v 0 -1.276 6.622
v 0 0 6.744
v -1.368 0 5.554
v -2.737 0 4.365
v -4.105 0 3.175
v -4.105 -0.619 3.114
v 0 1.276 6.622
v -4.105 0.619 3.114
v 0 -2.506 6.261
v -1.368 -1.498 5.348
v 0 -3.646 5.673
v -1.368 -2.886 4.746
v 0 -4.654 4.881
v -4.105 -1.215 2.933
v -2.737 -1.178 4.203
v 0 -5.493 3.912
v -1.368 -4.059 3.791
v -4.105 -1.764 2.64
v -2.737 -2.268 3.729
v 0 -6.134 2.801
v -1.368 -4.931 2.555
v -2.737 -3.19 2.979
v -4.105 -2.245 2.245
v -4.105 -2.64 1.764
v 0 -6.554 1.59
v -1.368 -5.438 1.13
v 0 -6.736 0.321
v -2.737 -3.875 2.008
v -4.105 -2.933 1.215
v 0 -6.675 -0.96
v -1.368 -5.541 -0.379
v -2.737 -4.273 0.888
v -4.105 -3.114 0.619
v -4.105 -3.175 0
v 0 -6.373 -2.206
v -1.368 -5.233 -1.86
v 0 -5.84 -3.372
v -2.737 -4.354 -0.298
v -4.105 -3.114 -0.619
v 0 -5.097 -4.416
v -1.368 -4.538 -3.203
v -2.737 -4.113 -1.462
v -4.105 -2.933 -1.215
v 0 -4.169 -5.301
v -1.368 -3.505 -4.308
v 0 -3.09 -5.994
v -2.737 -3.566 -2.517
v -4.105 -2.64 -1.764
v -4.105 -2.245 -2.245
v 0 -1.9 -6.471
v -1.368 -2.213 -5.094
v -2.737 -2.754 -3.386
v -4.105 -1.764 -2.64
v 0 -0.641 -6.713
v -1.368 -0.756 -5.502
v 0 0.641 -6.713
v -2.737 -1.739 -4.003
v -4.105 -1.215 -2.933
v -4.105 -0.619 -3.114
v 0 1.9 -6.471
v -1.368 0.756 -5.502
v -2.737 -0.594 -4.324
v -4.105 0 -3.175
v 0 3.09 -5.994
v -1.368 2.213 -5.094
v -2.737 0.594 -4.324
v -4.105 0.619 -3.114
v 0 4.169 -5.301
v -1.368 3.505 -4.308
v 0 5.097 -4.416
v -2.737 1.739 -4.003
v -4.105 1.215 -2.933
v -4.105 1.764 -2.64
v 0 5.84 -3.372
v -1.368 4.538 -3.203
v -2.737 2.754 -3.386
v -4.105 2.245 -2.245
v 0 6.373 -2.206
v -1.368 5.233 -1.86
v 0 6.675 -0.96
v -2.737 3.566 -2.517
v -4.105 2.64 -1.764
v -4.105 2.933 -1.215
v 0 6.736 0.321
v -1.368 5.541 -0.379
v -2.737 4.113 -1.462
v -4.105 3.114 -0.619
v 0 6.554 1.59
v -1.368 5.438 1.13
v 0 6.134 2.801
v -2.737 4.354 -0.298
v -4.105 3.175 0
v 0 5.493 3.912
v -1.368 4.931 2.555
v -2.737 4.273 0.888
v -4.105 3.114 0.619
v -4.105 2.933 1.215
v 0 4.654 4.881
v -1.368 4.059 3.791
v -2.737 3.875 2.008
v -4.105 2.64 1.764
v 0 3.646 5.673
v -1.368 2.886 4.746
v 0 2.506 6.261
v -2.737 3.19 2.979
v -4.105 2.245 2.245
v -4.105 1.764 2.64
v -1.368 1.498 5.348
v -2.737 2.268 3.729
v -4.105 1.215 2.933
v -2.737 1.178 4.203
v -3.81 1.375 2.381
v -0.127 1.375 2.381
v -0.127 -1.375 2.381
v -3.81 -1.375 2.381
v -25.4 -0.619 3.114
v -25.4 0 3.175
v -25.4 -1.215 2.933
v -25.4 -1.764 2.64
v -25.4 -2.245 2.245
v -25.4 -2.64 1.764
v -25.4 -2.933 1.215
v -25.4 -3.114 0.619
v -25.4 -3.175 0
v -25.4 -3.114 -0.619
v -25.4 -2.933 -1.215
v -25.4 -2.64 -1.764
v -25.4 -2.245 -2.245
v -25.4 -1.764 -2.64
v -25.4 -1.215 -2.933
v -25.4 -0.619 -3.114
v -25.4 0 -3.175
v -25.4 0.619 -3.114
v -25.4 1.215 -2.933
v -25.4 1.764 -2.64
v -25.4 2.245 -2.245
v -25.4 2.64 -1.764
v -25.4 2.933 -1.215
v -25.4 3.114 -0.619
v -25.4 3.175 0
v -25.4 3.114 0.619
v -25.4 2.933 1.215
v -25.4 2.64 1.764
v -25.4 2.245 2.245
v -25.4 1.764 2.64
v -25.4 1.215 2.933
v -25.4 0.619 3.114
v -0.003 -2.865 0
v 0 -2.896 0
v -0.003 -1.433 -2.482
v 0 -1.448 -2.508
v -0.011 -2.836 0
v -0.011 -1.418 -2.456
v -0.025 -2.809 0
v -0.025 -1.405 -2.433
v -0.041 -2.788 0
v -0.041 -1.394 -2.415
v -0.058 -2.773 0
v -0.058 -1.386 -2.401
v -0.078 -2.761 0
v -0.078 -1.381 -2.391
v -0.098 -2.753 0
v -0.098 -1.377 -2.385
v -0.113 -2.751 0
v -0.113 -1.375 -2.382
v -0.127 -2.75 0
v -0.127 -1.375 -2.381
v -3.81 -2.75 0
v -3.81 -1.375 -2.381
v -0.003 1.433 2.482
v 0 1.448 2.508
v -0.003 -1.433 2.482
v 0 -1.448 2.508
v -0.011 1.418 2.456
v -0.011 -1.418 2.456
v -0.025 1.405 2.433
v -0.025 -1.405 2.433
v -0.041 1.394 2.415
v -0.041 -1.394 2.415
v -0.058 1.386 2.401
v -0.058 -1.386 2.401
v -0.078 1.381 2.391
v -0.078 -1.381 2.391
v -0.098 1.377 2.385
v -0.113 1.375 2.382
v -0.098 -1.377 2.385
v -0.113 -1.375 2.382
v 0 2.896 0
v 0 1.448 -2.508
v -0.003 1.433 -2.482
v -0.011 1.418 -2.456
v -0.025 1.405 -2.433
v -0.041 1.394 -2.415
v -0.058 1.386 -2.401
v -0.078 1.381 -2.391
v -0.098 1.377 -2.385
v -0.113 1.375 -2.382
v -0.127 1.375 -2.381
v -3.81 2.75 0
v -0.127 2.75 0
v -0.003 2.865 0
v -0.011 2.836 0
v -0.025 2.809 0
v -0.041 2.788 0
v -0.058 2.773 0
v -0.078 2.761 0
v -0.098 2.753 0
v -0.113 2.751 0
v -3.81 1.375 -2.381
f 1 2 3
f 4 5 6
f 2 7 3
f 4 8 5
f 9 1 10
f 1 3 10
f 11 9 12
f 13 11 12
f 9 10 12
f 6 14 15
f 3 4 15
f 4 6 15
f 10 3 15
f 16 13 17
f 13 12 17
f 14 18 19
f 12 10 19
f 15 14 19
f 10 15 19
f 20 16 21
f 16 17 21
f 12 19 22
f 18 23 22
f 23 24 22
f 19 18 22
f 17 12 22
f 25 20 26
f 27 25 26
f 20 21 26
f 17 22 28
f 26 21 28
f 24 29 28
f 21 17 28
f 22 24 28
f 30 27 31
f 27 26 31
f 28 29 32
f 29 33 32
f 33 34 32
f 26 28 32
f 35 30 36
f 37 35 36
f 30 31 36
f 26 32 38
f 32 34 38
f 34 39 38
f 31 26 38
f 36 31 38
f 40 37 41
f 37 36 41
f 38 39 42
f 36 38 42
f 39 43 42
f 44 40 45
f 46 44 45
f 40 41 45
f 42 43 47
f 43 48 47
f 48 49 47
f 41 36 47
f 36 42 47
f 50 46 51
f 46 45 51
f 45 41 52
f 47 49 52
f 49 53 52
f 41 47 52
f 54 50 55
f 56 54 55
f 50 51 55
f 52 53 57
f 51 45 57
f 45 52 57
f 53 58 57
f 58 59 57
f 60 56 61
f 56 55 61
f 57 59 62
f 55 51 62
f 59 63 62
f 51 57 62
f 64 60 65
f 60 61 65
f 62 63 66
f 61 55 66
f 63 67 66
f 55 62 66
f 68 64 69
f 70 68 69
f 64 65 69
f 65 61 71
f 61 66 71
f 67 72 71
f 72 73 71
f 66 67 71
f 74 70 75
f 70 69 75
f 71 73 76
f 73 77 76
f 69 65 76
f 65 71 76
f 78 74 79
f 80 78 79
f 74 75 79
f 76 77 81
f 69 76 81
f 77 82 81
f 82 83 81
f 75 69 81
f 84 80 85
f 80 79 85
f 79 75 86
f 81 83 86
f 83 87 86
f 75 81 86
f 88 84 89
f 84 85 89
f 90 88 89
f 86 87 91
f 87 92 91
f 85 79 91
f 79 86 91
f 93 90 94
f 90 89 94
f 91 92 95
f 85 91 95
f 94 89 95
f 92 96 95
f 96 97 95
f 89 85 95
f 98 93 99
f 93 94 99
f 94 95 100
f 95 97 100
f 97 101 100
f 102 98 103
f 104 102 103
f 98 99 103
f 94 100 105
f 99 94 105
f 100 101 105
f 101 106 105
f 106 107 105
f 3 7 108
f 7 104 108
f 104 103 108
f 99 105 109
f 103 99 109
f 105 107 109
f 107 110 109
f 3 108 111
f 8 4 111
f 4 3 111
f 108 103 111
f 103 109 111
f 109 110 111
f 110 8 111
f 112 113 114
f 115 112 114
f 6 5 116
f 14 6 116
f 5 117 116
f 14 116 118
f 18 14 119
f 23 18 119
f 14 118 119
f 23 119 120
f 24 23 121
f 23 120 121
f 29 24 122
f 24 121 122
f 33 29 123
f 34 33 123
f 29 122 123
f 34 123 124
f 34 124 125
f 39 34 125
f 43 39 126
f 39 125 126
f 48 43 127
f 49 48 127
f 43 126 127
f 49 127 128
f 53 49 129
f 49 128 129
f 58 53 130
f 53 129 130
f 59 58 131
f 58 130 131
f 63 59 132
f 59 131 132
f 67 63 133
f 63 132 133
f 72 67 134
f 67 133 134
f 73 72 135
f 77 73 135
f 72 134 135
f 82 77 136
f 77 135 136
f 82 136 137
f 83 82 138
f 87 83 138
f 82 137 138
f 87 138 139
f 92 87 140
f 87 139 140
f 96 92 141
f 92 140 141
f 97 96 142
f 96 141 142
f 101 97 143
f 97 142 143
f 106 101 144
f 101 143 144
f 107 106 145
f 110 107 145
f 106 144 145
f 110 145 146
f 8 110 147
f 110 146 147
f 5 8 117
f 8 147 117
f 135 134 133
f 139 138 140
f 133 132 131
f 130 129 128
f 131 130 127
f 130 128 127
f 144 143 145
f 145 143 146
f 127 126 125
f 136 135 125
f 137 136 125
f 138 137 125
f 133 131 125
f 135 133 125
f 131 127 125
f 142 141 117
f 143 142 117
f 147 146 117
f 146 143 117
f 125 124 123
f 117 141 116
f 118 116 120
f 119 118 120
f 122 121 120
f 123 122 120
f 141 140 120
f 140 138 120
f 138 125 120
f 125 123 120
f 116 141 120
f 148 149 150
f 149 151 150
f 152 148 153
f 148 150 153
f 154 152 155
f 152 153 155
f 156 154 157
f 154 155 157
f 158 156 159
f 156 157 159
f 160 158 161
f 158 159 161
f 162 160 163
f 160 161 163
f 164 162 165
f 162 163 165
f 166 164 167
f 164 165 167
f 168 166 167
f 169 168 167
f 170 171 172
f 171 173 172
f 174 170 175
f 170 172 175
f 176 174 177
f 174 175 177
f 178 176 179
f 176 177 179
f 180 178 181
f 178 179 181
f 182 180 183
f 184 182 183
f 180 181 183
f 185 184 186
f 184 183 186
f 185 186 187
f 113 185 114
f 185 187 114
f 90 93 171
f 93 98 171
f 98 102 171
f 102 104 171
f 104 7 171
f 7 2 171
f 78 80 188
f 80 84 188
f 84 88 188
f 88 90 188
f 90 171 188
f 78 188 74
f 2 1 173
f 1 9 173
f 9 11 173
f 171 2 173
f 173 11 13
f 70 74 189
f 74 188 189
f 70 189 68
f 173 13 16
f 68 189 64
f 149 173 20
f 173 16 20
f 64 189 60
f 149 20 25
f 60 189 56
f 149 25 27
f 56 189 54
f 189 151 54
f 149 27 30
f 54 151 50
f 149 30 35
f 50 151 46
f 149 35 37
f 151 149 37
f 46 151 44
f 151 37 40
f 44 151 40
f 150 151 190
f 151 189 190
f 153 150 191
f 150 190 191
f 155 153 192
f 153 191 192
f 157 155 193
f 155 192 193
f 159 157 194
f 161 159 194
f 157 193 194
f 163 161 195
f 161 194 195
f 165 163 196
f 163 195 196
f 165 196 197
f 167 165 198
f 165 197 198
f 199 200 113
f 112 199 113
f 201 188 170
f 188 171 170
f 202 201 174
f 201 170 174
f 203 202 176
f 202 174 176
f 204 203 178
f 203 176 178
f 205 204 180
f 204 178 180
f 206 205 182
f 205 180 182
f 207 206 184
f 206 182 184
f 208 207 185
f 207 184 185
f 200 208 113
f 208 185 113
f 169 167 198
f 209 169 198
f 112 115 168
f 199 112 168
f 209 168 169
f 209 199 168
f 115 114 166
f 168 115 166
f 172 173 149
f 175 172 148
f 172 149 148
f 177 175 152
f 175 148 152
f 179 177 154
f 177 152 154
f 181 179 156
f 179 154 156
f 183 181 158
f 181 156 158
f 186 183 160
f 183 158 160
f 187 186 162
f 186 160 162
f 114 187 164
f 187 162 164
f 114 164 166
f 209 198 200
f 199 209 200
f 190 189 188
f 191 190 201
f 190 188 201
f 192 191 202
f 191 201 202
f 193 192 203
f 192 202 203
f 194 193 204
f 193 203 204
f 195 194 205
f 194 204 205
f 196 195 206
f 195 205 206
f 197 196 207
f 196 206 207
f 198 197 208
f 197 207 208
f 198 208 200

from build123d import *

# Parameters (mm, degrees)
CUT_EXTRUDE1_DEPTH = 3.81
FILLET1_R          = 0.127


with BuildPart() as part:
    # Sketch1 → Revolve1 (revolve)
    with BuildSketch(Plane(origin=(0, 0, 0), x_dir=(1, 0, 0), z_dir=(0, 1, 0)), mode=Mode.PRIVATE) as revolve1_sk:
        Polygon((0, 0), (0, 6.7437), (-4.105319735, 3.175), (-25.4, 3.175), (-25.4, 0), align=None)
    revolve(revolve1_sk.sketch.rotate(Axis((-25.4, 0, 0), (1, 0, 0)), 180), axis=Axis((-25.4, 0, 0), (1, 0, 0)))

    # Sketch2 → Cut-Extrude1 (cut)
    with BuildSketch(Plane(origin=(0, 0, 0), x_dir=(0, 0, -1), z_dir=(1, 0, 0))):
        Polygon((0, 2.749630657), (-2.38125, 1.374815329), (-2.38125, -1.374815329), (0, -2.749630657), (2.38125, -1.374815329), (2.38125, 1.374815329), align=None)
    extrude(amount=-CUT_EXTRUDE1_DEPTH, mode=Mode.SUBTRACT)

    # Fillet1
    fillet1_edges = [part.edges().sort_by_distance(p)[0] for p in [
        (0, 2.062222993, -1.190625),
        (0, 2.062222993, 1.190625),
        (0, 0, 2.38125),
        (0, -2.062222993, 1.190625),
        (0, -2.062222993, -1.190625),
        (0, 0, -2.38125),
    ]]
    fillet(fillet1_edges, radius=FILLET1_R)


solid = part.part
